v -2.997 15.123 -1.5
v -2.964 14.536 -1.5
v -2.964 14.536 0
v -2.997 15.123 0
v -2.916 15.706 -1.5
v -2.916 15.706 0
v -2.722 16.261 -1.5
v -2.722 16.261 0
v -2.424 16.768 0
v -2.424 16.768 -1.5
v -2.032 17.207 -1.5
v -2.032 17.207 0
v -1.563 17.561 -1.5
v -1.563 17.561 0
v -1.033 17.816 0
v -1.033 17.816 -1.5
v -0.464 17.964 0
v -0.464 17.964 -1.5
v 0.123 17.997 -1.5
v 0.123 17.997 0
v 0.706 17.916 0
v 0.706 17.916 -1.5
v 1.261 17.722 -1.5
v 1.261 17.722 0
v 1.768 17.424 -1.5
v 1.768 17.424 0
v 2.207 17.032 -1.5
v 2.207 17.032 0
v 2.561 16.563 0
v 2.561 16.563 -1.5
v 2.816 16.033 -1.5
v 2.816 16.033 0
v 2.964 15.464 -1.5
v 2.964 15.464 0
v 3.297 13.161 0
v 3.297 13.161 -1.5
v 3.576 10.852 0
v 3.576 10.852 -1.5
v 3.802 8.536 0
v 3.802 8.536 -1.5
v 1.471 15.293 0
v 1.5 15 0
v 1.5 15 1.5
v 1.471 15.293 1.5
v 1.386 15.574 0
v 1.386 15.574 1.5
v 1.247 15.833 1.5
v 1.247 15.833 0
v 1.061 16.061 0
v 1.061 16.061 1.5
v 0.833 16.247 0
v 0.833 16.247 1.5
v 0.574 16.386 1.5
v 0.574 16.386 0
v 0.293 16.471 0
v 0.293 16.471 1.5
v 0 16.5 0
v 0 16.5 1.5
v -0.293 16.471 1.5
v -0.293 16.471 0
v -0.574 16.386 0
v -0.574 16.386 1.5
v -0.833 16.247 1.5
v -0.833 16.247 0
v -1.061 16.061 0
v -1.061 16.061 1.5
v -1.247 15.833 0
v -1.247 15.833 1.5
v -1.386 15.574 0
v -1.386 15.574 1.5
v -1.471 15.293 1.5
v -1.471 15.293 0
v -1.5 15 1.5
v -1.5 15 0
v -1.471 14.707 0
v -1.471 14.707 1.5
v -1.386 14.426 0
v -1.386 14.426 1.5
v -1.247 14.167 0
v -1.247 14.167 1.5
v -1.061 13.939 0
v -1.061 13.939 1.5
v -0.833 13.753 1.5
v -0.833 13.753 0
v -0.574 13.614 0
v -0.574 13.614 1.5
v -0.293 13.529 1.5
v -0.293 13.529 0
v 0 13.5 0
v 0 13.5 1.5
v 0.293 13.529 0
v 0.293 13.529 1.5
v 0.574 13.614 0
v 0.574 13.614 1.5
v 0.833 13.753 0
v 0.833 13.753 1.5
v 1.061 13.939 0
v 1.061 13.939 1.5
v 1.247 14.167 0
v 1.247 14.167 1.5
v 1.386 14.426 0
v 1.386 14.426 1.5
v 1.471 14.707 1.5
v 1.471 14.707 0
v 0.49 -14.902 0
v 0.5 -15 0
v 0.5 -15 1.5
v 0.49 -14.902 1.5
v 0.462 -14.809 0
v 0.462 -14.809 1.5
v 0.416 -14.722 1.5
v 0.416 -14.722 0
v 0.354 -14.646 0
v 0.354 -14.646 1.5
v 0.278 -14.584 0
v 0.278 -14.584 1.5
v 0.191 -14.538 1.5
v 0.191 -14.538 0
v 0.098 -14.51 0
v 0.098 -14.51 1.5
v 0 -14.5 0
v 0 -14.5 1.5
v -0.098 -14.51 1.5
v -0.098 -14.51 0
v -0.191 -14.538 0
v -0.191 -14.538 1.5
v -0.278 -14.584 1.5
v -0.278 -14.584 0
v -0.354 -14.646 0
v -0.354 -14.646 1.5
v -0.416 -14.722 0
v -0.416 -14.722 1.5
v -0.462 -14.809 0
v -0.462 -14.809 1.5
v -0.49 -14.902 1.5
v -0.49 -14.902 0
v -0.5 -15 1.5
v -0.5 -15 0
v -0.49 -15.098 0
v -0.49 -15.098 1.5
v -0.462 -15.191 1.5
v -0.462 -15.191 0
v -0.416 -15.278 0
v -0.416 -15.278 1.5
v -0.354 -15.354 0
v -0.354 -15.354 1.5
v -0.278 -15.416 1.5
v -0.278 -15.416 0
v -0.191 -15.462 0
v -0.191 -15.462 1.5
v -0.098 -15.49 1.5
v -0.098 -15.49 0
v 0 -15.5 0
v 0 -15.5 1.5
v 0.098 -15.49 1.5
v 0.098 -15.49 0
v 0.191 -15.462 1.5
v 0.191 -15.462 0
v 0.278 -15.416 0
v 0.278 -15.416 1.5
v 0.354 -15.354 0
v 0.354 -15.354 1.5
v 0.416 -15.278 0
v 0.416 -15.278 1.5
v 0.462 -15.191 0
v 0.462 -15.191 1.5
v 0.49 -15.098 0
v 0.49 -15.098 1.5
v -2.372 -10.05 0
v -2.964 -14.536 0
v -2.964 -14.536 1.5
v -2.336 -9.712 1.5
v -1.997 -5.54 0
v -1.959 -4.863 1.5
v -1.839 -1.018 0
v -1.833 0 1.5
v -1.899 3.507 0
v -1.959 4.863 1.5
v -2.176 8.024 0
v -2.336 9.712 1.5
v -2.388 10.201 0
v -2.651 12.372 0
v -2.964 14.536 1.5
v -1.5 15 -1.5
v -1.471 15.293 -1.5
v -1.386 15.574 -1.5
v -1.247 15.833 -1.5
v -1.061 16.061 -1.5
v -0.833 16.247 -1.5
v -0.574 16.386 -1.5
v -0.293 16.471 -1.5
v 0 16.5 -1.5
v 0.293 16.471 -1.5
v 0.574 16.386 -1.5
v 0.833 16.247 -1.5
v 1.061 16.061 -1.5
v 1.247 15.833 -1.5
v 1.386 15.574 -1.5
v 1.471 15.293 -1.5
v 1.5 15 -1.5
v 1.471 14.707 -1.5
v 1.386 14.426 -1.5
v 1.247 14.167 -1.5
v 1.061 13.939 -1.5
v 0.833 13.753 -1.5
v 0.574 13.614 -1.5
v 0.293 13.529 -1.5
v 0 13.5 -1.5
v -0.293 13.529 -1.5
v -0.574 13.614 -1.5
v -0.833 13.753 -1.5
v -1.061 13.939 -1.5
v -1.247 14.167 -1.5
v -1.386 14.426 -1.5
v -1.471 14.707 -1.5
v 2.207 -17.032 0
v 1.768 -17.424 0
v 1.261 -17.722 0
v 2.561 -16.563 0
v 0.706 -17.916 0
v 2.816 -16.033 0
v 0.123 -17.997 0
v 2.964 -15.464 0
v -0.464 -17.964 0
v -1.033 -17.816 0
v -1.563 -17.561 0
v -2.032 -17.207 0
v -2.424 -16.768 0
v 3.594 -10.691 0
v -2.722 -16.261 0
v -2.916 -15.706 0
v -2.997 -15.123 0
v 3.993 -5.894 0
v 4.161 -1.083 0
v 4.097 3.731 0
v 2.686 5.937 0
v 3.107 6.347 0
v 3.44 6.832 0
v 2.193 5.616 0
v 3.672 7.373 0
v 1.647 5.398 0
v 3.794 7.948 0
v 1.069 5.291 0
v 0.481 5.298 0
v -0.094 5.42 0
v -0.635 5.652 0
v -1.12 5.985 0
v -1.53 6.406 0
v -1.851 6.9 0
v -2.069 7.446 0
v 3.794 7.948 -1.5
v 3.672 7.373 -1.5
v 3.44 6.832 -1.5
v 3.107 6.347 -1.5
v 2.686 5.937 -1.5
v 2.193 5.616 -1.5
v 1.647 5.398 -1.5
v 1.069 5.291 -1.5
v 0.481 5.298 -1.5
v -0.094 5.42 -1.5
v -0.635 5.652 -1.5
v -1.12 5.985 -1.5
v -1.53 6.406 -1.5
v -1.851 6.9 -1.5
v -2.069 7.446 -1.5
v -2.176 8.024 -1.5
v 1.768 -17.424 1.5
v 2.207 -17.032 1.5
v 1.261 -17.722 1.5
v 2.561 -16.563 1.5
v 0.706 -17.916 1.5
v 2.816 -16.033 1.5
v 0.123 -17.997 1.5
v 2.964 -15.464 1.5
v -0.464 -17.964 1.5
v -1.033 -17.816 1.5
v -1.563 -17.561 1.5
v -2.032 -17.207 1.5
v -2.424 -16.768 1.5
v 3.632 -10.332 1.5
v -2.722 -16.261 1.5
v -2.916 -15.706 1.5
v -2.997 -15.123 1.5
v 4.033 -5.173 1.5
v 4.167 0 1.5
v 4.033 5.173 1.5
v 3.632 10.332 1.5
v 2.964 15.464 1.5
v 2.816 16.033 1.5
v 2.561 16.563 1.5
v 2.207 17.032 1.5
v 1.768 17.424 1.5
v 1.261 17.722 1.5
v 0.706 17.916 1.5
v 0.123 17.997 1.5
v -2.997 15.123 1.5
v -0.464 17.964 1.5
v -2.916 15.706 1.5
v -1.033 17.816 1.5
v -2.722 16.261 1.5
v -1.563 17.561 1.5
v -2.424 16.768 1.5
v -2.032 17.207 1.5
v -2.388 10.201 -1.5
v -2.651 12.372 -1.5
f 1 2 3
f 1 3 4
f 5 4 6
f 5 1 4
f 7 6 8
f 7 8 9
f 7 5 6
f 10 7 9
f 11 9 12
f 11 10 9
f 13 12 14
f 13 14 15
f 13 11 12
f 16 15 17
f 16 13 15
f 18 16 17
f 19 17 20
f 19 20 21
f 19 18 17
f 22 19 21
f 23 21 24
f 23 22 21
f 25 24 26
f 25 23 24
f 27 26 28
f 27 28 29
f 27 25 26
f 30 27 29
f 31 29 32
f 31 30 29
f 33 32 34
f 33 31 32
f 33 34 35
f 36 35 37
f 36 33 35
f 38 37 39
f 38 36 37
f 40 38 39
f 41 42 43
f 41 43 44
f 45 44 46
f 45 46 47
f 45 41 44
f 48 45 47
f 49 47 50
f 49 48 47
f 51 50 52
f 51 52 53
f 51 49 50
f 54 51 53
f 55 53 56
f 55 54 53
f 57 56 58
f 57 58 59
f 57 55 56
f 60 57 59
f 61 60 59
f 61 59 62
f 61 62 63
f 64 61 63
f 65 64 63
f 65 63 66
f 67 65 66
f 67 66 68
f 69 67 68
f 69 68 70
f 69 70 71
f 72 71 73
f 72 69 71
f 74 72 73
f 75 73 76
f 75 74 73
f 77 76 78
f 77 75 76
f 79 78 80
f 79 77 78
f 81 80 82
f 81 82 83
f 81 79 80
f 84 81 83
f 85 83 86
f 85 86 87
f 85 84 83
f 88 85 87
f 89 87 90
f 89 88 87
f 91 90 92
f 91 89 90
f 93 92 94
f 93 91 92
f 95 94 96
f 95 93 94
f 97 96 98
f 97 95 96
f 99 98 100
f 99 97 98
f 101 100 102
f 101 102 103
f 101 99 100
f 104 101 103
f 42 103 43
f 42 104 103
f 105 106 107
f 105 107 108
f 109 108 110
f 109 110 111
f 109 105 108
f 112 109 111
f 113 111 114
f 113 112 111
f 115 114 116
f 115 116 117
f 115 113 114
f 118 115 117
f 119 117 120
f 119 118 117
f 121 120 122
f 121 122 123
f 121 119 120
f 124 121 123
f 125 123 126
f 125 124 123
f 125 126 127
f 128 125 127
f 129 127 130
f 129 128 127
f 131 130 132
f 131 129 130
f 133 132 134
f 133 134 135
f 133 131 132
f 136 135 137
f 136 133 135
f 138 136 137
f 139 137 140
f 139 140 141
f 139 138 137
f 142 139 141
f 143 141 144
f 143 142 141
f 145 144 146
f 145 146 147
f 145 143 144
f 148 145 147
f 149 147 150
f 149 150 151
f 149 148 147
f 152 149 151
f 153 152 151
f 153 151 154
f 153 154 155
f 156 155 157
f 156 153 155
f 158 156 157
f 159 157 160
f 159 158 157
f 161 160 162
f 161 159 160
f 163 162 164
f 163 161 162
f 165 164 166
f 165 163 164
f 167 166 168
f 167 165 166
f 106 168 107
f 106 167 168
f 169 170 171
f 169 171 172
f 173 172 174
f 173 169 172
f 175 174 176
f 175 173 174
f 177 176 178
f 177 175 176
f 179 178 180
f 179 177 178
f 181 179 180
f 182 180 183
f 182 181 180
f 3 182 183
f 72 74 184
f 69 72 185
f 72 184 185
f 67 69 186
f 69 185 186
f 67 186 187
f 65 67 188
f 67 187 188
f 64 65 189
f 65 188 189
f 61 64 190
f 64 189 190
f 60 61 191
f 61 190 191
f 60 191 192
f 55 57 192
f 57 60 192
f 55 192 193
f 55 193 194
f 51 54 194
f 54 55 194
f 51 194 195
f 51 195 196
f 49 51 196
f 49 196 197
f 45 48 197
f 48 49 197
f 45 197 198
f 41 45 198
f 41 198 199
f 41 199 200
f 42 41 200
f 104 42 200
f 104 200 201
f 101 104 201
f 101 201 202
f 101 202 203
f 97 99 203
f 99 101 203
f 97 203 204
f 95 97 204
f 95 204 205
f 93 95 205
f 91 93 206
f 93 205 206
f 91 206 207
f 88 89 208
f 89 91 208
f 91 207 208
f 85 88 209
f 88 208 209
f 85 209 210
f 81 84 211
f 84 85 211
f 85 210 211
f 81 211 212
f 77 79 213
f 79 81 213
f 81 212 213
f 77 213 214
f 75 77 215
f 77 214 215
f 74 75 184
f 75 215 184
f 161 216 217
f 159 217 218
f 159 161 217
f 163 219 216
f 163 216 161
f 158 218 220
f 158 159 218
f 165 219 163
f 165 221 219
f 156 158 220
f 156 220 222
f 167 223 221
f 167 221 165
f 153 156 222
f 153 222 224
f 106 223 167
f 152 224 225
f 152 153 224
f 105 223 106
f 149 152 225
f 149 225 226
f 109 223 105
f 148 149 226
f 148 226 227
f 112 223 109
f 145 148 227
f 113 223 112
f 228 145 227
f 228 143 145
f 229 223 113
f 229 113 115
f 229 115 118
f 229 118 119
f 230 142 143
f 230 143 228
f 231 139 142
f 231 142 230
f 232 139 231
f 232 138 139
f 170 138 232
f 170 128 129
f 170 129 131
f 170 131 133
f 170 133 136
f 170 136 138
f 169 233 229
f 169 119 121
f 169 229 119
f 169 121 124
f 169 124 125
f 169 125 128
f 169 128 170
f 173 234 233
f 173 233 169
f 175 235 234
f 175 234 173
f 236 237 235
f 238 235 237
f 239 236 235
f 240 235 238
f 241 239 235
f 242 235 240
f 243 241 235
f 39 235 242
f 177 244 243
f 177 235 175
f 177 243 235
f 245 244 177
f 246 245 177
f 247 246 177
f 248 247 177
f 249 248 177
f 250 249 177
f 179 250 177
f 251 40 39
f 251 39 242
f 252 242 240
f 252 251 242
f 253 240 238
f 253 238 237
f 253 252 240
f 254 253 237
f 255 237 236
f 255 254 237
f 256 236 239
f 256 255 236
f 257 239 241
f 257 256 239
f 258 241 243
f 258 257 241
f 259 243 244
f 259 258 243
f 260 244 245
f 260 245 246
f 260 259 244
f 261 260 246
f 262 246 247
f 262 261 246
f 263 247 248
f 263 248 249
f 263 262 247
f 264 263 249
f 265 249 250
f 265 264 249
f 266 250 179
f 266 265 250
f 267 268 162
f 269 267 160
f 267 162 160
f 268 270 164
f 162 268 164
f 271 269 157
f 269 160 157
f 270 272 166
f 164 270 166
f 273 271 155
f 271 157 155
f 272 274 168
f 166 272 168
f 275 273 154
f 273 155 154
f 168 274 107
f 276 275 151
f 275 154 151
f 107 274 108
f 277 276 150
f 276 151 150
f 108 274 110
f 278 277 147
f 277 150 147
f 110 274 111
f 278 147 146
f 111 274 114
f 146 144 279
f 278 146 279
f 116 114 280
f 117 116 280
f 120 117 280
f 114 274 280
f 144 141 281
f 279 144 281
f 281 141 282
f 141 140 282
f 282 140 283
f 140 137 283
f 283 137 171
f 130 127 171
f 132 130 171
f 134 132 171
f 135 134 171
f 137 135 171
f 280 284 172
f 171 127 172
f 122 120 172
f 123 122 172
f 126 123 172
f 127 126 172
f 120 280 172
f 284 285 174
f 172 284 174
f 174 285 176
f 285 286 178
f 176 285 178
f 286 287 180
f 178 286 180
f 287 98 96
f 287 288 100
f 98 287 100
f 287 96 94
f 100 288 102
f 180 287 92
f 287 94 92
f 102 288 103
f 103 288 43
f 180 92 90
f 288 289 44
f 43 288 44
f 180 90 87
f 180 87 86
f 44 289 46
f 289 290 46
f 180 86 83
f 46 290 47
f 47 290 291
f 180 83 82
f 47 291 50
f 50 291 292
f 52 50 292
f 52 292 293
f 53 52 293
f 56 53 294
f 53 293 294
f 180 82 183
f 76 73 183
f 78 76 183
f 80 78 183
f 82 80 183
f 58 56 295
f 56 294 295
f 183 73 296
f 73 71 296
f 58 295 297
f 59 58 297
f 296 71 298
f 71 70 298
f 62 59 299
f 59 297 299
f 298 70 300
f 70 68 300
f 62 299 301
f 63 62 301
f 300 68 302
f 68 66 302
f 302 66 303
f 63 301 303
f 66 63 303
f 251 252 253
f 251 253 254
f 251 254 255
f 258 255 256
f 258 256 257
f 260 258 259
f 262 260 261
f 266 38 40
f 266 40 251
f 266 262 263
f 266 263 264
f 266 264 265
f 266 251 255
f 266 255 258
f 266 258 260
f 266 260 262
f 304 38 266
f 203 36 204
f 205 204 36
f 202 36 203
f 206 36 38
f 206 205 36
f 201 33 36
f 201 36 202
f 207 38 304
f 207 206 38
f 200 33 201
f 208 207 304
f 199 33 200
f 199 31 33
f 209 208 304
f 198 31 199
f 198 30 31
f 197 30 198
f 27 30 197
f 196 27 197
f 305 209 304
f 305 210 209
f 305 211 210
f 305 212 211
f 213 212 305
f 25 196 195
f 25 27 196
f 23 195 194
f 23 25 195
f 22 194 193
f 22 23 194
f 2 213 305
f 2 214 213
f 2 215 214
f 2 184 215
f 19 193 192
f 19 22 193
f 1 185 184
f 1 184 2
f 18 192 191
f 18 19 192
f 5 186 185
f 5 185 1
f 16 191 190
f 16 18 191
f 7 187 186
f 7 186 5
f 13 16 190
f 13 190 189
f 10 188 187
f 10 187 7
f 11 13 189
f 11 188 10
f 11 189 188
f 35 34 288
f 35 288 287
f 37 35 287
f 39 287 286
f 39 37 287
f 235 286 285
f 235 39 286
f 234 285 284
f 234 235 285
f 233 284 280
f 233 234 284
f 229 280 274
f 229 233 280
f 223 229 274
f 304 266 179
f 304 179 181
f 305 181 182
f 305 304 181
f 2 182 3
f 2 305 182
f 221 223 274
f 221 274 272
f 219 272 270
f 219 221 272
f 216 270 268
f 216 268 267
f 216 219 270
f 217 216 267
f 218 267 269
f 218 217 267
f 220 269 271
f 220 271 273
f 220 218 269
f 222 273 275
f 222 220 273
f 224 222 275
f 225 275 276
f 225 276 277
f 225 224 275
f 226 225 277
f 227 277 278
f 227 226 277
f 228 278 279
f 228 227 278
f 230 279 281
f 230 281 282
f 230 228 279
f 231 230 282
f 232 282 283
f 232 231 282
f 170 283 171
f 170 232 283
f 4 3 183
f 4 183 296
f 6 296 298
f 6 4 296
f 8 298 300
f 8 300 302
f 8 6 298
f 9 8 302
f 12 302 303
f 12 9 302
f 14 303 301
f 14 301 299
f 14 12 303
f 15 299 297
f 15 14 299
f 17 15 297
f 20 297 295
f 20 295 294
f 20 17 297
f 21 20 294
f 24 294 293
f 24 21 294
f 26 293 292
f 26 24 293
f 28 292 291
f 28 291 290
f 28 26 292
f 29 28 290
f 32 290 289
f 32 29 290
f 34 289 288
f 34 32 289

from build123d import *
from build123d.topology import SkipClean

# Parameters (mm, degrees)
SKETCH1_R           = 1.5
SKETCH1_R_2         = 0.5
BOSS_EXTRUDE1_DEPTH = 1.5
BOSS_EXTRUDE2_START = 1.5
SKETCH2_R           = 1.5
BOSS_EXTRUDE2_DEPTH = 1.5


with BuildPart() as part:
    # Sketch1 → Boss-Extrude1 (new body)
    with BuildSketch(Plane.XY):
        with BuildLine():
            ThreePointArc((2.963913043, 15.463917526), (4.166811594, 0), (2.963913043, -15.463917526))
            ThreePointArc((2.963913043, -15.463917526), (-0.463917526, -17.963913043), (-2.963913043, -14.536082474))
            ThreePointArc((-2.963913043, -14.536082474), (-1.833188406, 0), (-2.963913043, 14.536082474))
            ThreePointArc((-2.963913043, 14.536082474), (-0.463917526, 17.963913043), (2.963913043, 15.463917526))
        make_face()
        with Locations((0, 15)):
            Circle(SKETCH1_R, mode=Mode.SUBTRACT)
        with Locations((0, -15)):
            Circle(SKETCH1_R_2, mode=Mode.SUBTRACT)
    extrude(amount=BOSS_EXTRUDE1_DEPTH)

    # Sketch2 → Boss-Extrude2 (add)
    with SkipClean():  # the faces are left unmerged after this step: merging them gives an invalid solid
        with BuildSketch(Plane(origin=(0, 0, 0), x_dir=(-1, 0, 0), z_dir=(0, 0, -1)).offset(BOSS_EXTRUDE2_START)):
            with BuildLine():
                ThreePointArc((-2.963913043, 15.463917526), (-3.443316756, 12.007311225), (-3.801821987, 8.536082474))
                ThreePointArc((-3.801821987, 8.536082474), (-1.06885415, 5.290949688), (2.176278636, 8.023917526))
                ThreePointArc((2.176278636, 8.023917526), (2.513273554, 11.286872551), (2.963913043, 14.536082474))
                ThreePointArc((2.963913043, 14.536082474), (0.463917526, 17.963913043), (-2.963913043, 15.463917526))
            make_face()
            with Locations((0, 15)):
                Circle(SKETCH2_R, mode=Mode.SUBTRACT)
        extrude(amount=-BOSS_EXTRUDE2_DEPTH)


solid = part.part
